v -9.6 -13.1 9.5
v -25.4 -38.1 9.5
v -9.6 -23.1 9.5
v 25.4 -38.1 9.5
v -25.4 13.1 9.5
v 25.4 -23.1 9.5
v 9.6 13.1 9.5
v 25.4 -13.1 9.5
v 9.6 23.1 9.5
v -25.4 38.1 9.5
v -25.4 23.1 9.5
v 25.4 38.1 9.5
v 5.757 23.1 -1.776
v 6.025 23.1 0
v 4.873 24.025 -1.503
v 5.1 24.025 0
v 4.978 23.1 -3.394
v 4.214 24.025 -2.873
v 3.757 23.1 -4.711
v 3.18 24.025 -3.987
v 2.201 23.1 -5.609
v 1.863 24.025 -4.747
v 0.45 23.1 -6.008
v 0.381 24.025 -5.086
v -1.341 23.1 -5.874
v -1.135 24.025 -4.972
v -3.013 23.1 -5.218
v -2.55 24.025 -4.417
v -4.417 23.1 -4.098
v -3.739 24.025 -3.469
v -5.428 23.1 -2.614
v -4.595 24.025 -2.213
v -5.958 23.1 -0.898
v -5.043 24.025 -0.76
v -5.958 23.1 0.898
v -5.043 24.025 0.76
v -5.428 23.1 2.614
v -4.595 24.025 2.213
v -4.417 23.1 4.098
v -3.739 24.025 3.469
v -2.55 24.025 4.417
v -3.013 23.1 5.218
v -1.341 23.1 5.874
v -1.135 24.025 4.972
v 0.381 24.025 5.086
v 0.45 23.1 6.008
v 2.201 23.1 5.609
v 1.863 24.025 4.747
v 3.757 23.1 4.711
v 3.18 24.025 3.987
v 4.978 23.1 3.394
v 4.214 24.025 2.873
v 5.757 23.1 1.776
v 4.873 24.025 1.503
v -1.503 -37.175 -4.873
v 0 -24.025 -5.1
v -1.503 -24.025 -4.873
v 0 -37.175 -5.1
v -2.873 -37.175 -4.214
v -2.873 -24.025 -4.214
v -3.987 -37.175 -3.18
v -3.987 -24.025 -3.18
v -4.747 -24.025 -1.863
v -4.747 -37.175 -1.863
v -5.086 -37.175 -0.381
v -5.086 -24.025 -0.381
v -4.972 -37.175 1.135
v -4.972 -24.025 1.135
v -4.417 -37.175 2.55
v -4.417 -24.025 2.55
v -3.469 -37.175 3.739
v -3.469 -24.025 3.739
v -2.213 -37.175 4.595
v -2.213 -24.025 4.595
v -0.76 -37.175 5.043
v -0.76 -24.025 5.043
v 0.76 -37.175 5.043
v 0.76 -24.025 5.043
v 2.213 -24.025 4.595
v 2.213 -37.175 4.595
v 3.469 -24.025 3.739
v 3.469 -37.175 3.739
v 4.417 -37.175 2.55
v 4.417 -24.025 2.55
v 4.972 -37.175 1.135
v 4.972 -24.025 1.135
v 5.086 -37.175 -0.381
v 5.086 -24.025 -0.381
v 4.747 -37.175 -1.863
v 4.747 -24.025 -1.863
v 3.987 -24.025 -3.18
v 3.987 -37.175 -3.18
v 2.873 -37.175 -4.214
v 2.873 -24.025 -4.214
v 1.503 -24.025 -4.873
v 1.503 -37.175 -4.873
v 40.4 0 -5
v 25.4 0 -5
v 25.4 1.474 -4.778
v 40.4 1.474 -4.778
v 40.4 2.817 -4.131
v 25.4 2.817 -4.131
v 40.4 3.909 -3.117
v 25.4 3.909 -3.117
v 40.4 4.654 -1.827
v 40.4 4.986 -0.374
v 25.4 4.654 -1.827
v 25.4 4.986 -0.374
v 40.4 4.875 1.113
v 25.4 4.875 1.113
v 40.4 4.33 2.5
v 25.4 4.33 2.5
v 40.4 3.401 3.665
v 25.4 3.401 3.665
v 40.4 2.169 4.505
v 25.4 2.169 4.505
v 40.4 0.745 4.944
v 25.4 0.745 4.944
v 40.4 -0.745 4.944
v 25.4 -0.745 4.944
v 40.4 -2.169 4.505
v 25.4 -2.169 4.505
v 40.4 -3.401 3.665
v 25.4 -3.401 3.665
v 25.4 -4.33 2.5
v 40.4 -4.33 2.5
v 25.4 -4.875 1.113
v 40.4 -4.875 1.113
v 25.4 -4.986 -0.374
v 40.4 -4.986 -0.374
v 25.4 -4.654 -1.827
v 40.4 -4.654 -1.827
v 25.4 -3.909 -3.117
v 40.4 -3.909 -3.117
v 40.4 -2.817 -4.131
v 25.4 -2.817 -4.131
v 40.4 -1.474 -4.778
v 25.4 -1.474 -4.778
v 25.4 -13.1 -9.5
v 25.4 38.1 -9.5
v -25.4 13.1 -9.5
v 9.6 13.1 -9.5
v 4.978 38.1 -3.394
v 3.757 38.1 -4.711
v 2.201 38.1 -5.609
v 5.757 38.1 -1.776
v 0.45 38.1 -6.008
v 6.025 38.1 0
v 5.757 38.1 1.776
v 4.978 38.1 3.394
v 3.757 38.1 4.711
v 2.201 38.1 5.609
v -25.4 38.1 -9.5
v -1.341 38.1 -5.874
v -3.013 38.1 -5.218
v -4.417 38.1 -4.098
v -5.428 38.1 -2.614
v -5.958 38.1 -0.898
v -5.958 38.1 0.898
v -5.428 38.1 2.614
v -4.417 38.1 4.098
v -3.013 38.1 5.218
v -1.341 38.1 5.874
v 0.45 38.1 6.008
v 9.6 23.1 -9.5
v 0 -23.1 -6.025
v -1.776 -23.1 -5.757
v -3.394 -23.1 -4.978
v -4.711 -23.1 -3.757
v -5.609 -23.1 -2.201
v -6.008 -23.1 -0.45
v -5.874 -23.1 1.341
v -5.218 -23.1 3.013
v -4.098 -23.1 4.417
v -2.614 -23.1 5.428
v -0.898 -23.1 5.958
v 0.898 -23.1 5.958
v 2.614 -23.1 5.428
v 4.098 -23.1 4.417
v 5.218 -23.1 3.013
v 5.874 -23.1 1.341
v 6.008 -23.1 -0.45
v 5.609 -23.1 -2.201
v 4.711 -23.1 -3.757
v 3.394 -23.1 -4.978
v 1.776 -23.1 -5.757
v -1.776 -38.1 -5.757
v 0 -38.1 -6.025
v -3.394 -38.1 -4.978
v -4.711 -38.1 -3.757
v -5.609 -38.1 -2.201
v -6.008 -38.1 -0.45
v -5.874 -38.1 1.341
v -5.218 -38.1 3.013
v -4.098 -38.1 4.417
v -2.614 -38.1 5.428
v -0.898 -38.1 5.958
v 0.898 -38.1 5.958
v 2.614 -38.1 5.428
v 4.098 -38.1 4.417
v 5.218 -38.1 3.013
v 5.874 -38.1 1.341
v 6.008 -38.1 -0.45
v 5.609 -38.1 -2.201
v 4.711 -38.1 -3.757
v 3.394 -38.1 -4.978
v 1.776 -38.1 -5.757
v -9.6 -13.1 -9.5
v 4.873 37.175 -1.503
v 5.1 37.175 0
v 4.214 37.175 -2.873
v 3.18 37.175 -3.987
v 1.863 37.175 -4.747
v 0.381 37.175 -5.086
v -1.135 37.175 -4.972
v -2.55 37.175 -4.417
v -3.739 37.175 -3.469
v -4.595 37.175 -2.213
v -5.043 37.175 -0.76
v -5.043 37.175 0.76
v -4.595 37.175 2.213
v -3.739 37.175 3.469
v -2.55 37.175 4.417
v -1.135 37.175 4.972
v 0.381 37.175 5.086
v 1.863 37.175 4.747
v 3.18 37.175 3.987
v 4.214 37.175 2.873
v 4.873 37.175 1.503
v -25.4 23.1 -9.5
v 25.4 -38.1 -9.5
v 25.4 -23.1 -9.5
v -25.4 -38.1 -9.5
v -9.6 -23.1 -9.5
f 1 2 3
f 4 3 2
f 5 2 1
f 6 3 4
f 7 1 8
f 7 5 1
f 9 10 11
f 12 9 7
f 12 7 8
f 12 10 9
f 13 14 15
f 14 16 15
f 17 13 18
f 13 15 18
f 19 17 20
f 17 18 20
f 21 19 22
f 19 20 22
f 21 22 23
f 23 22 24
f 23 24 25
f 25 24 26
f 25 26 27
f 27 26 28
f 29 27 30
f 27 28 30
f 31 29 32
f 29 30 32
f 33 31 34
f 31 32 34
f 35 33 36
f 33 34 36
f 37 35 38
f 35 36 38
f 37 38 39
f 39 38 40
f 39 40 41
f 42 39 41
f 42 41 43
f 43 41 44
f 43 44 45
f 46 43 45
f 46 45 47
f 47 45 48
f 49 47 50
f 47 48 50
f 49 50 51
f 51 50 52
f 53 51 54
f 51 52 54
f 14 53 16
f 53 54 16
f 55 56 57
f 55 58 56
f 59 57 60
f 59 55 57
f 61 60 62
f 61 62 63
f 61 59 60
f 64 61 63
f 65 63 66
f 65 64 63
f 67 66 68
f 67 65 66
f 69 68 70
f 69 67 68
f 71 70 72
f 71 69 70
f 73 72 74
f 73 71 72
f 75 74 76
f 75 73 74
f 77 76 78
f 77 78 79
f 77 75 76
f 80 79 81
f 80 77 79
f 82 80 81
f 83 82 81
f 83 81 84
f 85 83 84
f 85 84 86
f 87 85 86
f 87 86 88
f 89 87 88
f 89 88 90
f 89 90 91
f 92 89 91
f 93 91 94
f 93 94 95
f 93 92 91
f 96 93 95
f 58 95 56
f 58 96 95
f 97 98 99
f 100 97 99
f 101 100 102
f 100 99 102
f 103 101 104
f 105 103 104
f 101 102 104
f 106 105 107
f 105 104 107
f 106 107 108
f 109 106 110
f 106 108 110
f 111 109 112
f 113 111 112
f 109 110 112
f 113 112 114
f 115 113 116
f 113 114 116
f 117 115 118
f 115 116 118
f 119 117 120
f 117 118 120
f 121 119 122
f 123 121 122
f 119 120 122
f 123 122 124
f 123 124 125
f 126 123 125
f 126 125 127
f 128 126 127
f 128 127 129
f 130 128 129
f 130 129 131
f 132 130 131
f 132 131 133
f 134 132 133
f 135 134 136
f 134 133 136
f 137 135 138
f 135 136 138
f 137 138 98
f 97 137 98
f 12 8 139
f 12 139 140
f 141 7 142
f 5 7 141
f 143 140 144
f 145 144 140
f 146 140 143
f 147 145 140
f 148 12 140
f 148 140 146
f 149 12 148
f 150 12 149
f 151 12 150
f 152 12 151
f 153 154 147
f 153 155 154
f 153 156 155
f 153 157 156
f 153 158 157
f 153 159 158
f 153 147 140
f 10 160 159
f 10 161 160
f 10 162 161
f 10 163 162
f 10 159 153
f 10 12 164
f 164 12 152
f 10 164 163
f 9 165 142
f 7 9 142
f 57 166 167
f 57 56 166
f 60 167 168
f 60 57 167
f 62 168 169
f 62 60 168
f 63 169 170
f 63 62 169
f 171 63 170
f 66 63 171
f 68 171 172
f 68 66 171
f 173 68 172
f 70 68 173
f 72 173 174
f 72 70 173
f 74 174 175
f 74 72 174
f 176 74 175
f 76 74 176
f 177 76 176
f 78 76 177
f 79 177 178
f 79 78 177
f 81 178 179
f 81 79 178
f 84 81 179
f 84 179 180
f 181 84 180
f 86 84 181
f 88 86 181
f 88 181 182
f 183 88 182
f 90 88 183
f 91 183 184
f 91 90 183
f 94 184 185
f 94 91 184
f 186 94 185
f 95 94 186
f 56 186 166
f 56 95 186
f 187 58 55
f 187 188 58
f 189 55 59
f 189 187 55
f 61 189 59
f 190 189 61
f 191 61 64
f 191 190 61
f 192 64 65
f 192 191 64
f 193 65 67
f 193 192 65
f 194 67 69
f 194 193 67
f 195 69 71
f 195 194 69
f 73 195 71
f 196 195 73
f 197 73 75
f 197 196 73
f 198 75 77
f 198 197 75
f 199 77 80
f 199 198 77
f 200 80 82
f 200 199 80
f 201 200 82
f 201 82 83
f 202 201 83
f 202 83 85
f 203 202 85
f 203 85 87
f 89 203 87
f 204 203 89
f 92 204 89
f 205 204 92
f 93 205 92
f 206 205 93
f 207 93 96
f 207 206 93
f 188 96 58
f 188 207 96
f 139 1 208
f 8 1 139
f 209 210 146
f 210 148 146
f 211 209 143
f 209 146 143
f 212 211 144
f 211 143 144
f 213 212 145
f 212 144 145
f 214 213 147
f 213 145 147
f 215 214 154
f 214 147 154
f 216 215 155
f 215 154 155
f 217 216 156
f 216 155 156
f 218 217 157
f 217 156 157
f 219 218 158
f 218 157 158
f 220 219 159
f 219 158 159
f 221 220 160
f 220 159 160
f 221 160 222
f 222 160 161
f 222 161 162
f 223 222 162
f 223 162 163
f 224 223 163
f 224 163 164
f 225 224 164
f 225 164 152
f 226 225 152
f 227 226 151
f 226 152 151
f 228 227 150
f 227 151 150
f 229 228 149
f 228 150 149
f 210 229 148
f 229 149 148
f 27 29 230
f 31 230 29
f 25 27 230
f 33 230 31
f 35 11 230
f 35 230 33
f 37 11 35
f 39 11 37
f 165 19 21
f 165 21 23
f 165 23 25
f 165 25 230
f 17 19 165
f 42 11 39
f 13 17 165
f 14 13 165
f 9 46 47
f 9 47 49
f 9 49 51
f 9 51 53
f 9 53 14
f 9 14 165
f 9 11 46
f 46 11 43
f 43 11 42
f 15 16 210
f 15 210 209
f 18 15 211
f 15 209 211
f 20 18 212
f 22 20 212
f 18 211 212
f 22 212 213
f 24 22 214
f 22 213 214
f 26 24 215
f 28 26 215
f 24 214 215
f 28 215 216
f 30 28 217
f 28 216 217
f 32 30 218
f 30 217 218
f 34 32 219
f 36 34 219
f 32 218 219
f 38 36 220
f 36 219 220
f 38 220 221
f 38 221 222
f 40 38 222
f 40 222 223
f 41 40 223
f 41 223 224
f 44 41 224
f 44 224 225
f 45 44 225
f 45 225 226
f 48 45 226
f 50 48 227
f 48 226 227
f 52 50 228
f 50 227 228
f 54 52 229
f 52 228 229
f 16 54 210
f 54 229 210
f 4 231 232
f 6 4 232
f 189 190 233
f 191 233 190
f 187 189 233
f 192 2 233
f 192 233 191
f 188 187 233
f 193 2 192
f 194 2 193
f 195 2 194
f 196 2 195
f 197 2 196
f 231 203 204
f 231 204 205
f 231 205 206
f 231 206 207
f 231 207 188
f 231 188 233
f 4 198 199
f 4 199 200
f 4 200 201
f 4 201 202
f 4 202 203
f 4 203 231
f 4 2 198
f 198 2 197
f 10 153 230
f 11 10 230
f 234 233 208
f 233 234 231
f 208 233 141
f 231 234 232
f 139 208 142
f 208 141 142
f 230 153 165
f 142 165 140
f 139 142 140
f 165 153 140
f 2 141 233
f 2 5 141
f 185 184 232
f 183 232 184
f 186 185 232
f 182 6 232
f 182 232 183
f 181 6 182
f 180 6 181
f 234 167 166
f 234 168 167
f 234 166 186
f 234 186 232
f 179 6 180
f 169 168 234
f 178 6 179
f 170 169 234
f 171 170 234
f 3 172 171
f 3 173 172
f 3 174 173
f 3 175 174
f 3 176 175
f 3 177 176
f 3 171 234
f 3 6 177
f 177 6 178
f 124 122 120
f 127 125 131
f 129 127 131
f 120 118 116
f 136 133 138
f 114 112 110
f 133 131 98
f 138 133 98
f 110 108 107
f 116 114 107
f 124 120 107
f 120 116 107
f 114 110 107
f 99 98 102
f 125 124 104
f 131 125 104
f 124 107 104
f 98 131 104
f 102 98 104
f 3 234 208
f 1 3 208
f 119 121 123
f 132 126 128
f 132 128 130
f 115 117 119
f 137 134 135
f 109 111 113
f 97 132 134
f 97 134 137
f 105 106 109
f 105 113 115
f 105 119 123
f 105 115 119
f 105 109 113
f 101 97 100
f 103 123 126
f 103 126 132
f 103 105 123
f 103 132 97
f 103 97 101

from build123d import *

# Parameters (mm, degrees)
BOSS_EXTRUDE1_DEPTH = 9.5
SKETCH7_R           = 5
DATA_WIRE_DEPTH     = 15


# Read off the part's stored shape, not the designer's step: M12x1.75 Tapped Hole1
with BuildPart() as part:
    # Sketch1 → Boss-Extrude1 (new, symmetric)
    with BuildSketch(Plane.XY):
        Polygon((-25.4, 13.1), (-25.4, -38.1), (25.4, -38.1), (25.4, -23.1), (-9.6, -23.1), (-9.6, -13.1), (25.4, -13.1), (25.4, 38.1), (-25.4, 38.1), (-25.4, 23.1), (9.6, 23.1), (9.6, 13.1), align=None)
    extrude(amount=BOSS_EXTRUDE1_DEPTH, both=True)

    # M12x1.75 Tapped Hole1 outline → M12x1.75 Tapped Hole1 (revolve, cut)
    with BuildSketch(Plane.XY):
        Polygon((0, 23.1), (6.025, 23.1), (5.1, 24.025), (5.1, 37.175), (6.025, 38.1), (0, 38.1), align=None)
    revolve(axis=Axis((0, 0, 0), (0, 1, 0)), mode=Mode.SUBTRACT)

    # Sketch6 → M12x1.75 Tapped Hole2 (revolve, cut)
    with BuildSketch(Plane(origin=(0, -38.1, 0), x_dir=(0, 0, -1), z_dir=(1, 0, 0))):
        Polygon((0, 0), (0, 15), (6.025, 15), (5.1, 14.075), (5.1, 0.925), (6.025, 0), align=None)
    revolve(axis=Axis((0, -44.45, 0), (0, 1, 0)), mode=Mode.SUBTRACT)


with BuildPart() as body_2:
    # Sketch7 → Data Wire (new body)
    with BuildSketch(Plane(origin=(25.4, 0, 0), x_dir=(0, 0, -1), z_dir=(1, 0, 0))):
        Circle(SKETCH7_R)
    extrude(amount=DATA_WIRE_DEPTH)


solid = Compound([part.part, body_2.part])
